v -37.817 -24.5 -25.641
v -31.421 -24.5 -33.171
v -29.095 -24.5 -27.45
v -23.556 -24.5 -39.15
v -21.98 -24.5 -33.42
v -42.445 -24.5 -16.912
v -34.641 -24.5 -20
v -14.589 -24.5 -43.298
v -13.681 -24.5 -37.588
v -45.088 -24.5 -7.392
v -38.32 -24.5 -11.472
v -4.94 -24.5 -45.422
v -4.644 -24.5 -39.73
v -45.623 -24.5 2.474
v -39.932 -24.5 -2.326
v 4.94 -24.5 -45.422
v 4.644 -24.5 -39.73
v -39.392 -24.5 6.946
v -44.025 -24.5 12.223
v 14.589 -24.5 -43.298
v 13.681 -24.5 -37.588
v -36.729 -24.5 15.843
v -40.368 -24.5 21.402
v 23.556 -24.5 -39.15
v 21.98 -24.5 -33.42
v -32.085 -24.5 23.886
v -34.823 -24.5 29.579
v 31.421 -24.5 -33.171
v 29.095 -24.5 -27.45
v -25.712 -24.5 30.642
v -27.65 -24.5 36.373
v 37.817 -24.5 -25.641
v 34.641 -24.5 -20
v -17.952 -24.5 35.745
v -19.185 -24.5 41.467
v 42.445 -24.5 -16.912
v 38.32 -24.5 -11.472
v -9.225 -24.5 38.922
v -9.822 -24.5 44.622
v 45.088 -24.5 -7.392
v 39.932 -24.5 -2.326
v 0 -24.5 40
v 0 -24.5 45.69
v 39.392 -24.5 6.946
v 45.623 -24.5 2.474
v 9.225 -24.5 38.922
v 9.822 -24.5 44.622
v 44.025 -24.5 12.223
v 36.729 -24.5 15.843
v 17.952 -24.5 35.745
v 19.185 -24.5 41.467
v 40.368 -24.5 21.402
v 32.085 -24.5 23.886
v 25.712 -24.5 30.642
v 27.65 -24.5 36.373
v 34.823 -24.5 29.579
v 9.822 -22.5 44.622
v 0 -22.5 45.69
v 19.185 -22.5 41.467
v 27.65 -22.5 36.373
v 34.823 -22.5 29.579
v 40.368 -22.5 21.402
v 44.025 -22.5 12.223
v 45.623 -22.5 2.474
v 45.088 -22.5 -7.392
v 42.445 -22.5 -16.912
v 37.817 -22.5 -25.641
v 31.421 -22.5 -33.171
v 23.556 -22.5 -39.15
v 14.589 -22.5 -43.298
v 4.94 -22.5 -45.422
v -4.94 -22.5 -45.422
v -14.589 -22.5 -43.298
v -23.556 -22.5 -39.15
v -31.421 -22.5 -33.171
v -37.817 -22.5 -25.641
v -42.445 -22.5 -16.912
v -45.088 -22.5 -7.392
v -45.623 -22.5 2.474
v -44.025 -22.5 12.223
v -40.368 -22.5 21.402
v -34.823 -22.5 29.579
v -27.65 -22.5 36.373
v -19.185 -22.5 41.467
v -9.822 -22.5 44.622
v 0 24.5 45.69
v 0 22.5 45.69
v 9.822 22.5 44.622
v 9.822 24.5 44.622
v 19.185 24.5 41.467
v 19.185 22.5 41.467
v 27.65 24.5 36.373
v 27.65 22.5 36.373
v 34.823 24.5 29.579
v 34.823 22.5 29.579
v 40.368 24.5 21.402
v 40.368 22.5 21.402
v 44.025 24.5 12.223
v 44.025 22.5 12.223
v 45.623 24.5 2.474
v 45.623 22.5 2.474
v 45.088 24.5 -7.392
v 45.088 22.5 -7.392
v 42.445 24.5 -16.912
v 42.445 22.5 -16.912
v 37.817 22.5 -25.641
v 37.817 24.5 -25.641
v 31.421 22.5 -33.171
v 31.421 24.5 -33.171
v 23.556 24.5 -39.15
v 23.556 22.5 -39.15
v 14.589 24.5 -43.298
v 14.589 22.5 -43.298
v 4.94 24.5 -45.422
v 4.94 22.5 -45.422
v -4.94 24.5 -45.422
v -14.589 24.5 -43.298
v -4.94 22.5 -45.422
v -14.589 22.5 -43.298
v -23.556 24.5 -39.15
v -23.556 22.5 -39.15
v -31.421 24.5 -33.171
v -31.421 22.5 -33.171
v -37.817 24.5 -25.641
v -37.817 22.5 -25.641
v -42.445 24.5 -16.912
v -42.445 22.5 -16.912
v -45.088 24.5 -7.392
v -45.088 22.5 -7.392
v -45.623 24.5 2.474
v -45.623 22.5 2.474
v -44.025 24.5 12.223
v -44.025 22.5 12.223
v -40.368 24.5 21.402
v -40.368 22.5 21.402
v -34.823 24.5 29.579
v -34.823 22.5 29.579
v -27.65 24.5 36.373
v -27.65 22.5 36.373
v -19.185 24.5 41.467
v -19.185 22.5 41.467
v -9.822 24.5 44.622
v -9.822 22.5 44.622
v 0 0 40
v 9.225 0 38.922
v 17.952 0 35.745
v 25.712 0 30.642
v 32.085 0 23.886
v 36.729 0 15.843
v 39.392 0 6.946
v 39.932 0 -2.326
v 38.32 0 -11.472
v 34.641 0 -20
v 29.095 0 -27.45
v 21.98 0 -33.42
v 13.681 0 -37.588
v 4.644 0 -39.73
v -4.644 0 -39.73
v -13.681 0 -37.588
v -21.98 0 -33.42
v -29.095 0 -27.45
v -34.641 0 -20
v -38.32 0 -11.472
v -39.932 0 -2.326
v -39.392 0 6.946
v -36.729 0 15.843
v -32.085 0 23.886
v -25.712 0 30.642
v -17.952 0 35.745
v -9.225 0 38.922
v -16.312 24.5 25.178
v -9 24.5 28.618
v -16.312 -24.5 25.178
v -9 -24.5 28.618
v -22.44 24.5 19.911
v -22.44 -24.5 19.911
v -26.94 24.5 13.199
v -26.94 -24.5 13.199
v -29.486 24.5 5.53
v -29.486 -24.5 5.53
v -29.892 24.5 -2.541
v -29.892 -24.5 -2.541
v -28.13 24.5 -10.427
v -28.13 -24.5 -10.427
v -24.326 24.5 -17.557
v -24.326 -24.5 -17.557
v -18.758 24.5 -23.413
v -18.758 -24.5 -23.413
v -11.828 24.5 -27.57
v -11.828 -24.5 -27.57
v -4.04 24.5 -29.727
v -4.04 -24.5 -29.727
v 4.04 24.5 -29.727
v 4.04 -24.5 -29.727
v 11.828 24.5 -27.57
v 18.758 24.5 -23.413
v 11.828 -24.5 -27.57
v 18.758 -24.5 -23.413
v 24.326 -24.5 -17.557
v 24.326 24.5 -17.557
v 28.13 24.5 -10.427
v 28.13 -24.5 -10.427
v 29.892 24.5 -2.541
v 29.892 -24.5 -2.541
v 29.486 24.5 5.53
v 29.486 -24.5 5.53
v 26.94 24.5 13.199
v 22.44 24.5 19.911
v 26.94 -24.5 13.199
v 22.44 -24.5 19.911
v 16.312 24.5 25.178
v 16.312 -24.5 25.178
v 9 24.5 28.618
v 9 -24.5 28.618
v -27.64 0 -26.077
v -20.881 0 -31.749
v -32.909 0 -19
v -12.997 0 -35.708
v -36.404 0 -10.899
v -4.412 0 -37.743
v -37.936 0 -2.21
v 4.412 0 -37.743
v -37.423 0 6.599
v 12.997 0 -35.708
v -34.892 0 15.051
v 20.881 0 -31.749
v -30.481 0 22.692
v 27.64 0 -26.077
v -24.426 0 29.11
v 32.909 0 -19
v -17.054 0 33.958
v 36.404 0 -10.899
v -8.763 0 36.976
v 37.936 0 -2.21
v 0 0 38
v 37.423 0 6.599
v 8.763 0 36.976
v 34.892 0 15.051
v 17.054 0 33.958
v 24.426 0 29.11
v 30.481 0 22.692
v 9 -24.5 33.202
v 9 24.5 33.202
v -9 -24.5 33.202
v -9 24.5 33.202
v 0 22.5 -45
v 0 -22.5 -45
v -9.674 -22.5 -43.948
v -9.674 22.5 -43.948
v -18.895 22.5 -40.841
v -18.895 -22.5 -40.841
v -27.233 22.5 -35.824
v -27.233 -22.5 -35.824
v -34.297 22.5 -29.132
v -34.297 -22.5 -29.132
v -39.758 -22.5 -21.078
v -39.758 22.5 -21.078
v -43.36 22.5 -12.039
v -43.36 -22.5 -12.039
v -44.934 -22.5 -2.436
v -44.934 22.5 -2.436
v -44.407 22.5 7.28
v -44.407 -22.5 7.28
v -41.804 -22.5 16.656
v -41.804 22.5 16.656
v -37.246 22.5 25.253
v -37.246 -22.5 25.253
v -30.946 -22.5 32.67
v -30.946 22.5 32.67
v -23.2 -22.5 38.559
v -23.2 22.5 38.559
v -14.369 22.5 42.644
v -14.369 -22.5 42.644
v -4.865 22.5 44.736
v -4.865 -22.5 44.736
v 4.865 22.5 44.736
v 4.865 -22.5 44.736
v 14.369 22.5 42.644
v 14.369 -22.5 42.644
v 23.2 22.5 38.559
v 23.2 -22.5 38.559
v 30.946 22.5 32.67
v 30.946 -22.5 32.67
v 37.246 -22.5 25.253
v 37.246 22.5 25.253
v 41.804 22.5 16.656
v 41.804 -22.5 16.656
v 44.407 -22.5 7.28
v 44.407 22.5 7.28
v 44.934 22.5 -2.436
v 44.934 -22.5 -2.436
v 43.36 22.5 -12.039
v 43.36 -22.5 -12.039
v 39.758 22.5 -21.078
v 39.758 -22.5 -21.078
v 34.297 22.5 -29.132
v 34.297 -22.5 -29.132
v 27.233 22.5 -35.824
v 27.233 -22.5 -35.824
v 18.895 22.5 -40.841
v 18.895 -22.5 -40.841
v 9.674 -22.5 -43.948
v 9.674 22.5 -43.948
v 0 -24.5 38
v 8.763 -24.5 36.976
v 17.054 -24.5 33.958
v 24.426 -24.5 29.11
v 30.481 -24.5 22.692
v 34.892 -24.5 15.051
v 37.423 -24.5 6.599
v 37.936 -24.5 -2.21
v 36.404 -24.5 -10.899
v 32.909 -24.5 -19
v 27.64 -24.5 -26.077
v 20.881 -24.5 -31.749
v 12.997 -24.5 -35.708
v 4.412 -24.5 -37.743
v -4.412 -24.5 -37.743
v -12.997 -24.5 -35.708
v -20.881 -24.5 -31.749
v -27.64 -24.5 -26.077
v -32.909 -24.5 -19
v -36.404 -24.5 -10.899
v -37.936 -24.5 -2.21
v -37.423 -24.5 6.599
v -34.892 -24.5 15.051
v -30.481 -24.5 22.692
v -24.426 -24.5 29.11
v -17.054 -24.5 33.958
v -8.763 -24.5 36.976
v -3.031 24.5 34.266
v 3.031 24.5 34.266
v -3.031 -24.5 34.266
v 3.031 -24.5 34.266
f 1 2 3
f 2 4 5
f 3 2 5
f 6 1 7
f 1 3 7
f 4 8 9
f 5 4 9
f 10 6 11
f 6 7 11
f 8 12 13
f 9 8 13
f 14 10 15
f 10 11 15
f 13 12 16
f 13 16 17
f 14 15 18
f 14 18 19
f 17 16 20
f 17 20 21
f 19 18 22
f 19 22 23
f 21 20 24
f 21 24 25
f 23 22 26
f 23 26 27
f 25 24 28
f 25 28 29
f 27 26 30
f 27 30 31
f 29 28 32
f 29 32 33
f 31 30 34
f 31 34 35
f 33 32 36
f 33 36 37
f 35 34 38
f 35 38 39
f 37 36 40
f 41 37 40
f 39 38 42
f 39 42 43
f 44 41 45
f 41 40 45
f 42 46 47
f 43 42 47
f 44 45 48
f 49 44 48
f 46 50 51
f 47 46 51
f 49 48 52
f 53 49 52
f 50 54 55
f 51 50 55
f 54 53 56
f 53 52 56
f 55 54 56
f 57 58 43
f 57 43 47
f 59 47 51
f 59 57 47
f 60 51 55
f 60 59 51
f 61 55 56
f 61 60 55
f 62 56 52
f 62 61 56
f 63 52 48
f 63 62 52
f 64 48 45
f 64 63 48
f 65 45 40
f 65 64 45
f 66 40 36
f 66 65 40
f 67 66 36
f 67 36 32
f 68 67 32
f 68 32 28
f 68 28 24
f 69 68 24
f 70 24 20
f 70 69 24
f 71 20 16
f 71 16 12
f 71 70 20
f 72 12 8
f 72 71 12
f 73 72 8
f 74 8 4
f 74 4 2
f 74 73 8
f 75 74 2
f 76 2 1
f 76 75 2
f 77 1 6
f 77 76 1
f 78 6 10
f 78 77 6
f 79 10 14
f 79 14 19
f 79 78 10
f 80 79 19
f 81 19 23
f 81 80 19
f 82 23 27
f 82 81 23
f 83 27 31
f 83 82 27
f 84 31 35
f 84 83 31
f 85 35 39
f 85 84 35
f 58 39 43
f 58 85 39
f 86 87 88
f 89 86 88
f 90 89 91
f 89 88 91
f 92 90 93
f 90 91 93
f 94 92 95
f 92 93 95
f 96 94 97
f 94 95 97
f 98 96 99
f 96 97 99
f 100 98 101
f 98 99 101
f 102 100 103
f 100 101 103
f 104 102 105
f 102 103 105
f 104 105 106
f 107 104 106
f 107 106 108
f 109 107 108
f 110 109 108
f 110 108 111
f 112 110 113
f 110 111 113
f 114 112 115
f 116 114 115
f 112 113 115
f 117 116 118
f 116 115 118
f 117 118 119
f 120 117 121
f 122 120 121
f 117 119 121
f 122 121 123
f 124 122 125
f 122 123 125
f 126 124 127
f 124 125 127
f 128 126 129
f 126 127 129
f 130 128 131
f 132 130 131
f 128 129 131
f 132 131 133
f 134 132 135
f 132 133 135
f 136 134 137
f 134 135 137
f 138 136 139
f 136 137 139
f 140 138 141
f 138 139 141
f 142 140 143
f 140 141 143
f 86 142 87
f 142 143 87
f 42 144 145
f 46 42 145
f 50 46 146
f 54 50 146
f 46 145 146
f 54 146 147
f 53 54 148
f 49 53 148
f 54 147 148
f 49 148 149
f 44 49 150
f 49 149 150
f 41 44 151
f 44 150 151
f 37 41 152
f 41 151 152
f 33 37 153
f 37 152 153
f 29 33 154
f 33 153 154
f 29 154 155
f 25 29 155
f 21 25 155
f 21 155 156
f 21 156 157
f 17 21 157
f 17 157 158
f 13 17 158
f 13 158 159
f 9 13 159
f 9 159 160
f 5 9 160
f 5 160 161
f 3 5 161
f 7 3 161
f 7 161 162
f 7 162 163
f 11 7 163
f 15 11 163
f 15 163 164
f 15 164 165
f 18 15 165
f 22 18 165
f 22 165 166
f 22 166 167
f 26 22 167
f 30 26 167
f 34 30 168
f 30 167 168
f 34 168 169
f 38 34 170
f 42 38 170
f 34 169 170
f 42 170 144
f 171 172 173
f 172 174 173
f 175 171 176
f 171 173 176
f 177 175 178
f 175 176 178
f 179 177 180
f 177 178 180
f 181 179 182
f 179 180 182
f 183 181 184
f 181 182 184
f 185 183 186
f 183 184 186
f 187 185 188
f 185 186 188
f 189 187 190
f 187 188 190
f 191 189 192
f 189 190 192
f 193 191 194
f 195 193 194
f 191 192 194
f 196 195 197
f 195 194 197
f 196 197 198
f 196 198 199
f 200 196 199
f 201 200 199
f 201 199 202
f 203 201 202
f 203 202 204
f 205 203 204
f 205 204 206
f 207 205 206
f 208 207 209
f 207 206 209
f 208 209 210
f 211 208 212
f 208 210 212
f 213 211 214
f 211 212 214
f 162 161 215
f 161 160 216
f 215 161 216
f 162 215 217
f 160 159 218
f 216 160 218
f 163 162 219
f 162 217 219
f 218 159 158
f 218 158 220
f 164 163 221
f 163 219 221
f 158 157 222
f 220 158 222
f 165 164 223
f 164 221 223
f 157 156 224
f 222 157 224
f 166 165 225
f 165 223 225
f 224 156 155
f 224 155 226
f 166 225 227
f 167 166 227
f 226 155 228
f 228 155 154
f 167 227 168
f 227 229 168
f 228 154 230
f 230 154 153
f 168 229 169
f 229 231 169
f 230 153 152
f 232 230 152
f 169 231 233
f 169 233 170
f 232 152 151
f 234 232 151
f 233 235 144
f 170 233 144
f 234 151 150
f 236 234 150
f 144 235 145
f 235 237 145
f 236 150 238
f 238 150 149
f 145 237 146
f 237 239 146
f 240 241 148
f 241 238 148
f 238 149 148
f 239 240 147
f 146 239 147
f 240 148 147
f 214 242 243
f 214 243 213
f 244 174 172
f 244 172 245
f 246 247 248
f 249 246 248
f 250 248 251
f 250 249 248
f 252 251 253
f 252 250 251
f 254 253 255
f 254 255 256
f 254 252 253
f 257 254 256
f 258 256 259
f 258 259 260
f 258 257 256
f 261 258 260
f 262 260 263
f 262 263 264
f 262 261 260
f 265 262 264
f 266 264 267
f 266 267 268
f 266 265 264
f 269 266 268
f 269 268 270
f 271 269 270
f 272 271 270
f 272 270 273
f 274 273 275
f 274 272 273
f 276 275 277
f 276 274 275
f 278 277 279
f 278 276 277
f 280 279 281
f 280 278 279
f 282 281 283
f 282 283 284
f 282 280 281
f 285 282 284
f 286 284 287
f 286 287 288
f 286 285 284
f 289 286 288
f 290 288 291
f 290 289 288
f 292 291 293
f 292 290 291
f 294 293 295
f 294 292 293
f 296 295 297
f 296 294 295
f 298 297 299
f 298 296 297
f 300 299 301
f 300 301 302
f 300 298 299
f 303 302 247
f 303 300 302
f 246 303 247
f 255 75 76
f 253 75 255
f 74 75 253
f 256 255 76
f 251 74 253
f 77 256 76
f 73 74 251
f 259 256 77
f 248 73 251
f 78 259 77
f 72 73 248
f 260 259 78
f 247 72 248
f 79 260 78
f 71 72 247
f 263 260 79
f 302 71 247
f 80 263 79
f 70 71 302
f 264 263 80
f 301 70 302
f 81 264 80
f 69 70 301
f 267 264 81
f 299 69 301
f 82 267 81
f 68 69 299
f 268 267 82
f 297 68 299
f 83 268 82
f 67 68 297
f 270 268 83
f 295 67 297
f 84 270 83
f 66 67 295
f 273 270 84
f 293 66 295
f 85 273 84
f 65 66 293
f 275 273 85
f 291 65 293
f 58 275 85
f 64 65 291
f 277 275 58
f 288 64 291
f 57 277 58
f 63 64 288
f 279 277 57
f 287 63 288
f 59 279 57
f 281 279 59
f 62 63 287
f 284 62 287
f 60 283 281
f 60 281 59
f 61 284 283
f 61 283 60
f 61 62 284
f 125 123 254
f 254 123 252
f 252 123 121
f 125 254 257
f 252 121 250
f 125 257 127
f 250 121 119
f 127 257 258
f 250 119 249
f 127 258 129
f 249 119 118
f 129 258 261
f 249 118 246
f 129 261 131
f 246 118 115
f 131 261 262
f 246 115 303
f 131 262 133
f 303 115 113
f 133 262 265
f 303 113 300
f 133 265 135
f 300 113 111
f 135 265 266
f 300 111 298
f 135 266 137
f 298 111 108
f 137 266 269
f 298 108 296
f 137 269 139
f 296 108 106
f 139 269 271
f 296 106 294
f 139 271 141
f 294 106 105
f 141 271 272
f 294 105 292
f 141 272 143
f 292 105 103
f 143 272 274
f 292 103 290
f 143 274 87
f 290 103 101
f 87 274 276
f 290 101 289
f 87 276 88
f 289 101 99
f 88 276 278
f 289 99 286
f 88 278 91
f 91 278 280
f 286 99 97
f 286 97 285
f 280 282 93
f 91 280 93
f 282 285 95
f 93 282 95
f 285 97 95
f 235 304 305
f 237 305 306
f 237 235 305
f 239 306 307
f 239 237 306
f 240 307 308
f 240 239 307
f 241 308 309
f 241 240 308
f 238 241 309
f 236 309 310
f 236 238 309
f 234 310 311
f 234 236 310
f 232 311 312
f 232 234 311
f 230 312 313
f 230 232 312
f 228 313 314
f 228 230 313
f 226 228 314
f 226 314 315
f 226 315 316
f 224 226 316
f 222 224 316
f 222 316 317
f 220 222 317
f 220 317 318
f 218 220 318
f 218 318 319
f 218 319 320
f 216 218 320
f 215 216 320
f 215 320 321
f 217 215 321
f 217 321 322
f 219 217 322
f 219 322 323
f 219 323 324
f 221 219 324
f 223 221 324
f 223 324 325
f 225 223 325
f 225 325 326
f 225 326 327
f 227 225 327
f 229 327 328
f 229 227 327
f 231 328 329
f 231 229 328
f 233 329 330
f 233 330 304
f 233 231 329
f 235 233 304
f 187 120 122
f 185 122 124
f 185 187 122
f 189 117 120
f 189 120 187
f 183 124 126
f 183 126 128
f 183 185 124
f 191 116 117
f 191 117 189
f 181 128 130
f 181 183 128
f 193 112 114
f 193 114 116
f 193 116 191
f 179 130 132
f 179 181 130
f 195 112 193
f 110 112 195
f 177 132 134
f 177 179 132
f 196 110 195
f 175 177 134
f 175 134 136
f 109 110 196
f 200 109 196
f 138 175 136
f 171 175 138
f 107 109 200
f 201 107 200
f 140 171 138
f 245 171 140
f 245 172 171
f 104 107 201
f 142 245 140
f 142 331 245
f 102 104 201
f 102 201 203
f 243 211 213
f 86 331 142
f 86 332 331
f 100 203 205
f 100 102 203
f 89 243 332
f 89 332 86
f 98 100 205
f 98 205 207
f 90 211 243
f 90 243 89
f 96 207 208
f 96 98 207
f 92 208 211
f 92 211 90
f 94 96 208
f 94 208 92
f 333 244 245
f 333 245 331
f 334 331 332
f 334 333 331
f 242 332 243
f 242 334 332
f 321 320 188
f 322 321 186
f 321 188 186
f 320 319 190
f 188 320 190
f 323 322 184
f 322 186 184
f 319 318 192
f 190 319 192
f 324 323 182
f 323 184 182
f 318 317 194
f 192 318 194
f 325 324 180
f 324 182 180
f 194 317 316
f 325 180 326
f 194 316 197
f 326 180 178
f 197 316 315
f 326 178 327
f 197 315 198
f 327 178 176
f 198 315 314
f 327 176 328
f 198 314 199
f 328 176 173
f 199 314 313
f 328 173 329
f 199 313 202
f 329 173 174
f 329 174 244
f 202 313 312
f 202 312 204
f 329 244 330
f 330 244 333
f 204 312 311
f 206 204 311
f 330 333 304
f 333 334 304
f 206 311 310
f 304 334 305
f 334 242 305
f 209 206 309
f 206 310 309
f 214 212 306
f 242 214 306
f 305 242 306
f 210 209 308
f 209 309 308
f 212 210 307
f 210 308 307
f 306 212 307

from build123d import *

# Parameters (mm, degrees)
SKETCH1_R           = 45
BOSS_EXTRUDE1_DEPTH = 22.5
SKETCH2_R           = 45.69
BOSS_EXTRUDE2_DEPTH = 2
SKETCH3_R           = 40
SKETCH3_R_2         = 38
CUT_EXTRUDE1_DEPTH  = 32
SKETCH4_R           = 30
CUT_EXTRUDE2_DEPTH  = 82.093478159
CUT_EXTRUDE3_DEPTH  = 82.093478159


with BuildPart() as part:
    # Sketch1 → Boss-Extrude1 (new, symmetric)
    with BuildSketch(Plane(origin=(0, 0, 0), x_dir=(1, 0, 0), z_dir=(0, 1, 0))):
        with Locations(Location((0, 0, 0), (0, 0, 90))):
            Circle(SKETCH1_R)
    extrude(amount=BOSS_EXTRUDE1_DEPTH, both=True)

    # Sketch2 → Boss-Extrude2 (add)
    with BuildSketch(Plane(origin=(0, 22.5, 0), x_dir=(1, 0, 0), z_dir=(0, 1, 0))):
        with Locations(Location((0, 0, 0), (0, 0, 270))):
            Circle(SKETCH2_R)
    boss_extrude2 = extrude(amount=BOSS_EXTRUDE2_DEPTH)

    # Mirror1: Boss-Extrude2 across plane
    add(boss_extrude2.mirror(Plane.ZX))

    # Sketch3 → Cut-Extrude1 (cut)
    with BuildSketch(Plane(origin=(0, 0, 0), x_dir=(1, 0, 0), z_dir=(0, 1, 0))):
        with Locations(Location((0, 0, 0), (0, 0, 270))):
            Circle(SKETCH3_R)
        with Locations(Location((0, 0, 0), (0, 0, 270))):
            Circle(SKETCH3_R_2, mode=Mode.SUBTRACT)
    extrude(amount=-CUT_EXTRUDE1_DEPTH, mode=Mode.SUBTRACT)

    # Sketch4 → Cut-Extrude2 (cut, through all)
    with BuildSketch(Plane.XZ.offset(24.5)):
        with Locations(Location((0, 0, 0), (0, 0, 270))):
            Circle(SKETCH4_R)
    extrude(amount=-CUT_EXTRUDE2_DEPTH, mode=Mode.SUBTRACT)

    # Sketch6 → Cut-Extrude3 (cut, through all)
    with BuildSketch(Plane.XZ.offset(24.5)):
        with BuildLine():
            Line((-9, 28.618176043), (-9, 33.20180718))
            ThreePointArc((-9, 33.20180718), (0, 34.4), (9, 33.20180718))
            Line((9, 33.20180718), (9, 28.618176043))
            ThreePointArc((9, 28.618176043), (0, 30), (-9, 28.618176043))
        make_face()
    extrude(amount=-CUT_EXTRUDE3_DEPTH, mode=Mode.SUBTRACT)


solid = part.part
